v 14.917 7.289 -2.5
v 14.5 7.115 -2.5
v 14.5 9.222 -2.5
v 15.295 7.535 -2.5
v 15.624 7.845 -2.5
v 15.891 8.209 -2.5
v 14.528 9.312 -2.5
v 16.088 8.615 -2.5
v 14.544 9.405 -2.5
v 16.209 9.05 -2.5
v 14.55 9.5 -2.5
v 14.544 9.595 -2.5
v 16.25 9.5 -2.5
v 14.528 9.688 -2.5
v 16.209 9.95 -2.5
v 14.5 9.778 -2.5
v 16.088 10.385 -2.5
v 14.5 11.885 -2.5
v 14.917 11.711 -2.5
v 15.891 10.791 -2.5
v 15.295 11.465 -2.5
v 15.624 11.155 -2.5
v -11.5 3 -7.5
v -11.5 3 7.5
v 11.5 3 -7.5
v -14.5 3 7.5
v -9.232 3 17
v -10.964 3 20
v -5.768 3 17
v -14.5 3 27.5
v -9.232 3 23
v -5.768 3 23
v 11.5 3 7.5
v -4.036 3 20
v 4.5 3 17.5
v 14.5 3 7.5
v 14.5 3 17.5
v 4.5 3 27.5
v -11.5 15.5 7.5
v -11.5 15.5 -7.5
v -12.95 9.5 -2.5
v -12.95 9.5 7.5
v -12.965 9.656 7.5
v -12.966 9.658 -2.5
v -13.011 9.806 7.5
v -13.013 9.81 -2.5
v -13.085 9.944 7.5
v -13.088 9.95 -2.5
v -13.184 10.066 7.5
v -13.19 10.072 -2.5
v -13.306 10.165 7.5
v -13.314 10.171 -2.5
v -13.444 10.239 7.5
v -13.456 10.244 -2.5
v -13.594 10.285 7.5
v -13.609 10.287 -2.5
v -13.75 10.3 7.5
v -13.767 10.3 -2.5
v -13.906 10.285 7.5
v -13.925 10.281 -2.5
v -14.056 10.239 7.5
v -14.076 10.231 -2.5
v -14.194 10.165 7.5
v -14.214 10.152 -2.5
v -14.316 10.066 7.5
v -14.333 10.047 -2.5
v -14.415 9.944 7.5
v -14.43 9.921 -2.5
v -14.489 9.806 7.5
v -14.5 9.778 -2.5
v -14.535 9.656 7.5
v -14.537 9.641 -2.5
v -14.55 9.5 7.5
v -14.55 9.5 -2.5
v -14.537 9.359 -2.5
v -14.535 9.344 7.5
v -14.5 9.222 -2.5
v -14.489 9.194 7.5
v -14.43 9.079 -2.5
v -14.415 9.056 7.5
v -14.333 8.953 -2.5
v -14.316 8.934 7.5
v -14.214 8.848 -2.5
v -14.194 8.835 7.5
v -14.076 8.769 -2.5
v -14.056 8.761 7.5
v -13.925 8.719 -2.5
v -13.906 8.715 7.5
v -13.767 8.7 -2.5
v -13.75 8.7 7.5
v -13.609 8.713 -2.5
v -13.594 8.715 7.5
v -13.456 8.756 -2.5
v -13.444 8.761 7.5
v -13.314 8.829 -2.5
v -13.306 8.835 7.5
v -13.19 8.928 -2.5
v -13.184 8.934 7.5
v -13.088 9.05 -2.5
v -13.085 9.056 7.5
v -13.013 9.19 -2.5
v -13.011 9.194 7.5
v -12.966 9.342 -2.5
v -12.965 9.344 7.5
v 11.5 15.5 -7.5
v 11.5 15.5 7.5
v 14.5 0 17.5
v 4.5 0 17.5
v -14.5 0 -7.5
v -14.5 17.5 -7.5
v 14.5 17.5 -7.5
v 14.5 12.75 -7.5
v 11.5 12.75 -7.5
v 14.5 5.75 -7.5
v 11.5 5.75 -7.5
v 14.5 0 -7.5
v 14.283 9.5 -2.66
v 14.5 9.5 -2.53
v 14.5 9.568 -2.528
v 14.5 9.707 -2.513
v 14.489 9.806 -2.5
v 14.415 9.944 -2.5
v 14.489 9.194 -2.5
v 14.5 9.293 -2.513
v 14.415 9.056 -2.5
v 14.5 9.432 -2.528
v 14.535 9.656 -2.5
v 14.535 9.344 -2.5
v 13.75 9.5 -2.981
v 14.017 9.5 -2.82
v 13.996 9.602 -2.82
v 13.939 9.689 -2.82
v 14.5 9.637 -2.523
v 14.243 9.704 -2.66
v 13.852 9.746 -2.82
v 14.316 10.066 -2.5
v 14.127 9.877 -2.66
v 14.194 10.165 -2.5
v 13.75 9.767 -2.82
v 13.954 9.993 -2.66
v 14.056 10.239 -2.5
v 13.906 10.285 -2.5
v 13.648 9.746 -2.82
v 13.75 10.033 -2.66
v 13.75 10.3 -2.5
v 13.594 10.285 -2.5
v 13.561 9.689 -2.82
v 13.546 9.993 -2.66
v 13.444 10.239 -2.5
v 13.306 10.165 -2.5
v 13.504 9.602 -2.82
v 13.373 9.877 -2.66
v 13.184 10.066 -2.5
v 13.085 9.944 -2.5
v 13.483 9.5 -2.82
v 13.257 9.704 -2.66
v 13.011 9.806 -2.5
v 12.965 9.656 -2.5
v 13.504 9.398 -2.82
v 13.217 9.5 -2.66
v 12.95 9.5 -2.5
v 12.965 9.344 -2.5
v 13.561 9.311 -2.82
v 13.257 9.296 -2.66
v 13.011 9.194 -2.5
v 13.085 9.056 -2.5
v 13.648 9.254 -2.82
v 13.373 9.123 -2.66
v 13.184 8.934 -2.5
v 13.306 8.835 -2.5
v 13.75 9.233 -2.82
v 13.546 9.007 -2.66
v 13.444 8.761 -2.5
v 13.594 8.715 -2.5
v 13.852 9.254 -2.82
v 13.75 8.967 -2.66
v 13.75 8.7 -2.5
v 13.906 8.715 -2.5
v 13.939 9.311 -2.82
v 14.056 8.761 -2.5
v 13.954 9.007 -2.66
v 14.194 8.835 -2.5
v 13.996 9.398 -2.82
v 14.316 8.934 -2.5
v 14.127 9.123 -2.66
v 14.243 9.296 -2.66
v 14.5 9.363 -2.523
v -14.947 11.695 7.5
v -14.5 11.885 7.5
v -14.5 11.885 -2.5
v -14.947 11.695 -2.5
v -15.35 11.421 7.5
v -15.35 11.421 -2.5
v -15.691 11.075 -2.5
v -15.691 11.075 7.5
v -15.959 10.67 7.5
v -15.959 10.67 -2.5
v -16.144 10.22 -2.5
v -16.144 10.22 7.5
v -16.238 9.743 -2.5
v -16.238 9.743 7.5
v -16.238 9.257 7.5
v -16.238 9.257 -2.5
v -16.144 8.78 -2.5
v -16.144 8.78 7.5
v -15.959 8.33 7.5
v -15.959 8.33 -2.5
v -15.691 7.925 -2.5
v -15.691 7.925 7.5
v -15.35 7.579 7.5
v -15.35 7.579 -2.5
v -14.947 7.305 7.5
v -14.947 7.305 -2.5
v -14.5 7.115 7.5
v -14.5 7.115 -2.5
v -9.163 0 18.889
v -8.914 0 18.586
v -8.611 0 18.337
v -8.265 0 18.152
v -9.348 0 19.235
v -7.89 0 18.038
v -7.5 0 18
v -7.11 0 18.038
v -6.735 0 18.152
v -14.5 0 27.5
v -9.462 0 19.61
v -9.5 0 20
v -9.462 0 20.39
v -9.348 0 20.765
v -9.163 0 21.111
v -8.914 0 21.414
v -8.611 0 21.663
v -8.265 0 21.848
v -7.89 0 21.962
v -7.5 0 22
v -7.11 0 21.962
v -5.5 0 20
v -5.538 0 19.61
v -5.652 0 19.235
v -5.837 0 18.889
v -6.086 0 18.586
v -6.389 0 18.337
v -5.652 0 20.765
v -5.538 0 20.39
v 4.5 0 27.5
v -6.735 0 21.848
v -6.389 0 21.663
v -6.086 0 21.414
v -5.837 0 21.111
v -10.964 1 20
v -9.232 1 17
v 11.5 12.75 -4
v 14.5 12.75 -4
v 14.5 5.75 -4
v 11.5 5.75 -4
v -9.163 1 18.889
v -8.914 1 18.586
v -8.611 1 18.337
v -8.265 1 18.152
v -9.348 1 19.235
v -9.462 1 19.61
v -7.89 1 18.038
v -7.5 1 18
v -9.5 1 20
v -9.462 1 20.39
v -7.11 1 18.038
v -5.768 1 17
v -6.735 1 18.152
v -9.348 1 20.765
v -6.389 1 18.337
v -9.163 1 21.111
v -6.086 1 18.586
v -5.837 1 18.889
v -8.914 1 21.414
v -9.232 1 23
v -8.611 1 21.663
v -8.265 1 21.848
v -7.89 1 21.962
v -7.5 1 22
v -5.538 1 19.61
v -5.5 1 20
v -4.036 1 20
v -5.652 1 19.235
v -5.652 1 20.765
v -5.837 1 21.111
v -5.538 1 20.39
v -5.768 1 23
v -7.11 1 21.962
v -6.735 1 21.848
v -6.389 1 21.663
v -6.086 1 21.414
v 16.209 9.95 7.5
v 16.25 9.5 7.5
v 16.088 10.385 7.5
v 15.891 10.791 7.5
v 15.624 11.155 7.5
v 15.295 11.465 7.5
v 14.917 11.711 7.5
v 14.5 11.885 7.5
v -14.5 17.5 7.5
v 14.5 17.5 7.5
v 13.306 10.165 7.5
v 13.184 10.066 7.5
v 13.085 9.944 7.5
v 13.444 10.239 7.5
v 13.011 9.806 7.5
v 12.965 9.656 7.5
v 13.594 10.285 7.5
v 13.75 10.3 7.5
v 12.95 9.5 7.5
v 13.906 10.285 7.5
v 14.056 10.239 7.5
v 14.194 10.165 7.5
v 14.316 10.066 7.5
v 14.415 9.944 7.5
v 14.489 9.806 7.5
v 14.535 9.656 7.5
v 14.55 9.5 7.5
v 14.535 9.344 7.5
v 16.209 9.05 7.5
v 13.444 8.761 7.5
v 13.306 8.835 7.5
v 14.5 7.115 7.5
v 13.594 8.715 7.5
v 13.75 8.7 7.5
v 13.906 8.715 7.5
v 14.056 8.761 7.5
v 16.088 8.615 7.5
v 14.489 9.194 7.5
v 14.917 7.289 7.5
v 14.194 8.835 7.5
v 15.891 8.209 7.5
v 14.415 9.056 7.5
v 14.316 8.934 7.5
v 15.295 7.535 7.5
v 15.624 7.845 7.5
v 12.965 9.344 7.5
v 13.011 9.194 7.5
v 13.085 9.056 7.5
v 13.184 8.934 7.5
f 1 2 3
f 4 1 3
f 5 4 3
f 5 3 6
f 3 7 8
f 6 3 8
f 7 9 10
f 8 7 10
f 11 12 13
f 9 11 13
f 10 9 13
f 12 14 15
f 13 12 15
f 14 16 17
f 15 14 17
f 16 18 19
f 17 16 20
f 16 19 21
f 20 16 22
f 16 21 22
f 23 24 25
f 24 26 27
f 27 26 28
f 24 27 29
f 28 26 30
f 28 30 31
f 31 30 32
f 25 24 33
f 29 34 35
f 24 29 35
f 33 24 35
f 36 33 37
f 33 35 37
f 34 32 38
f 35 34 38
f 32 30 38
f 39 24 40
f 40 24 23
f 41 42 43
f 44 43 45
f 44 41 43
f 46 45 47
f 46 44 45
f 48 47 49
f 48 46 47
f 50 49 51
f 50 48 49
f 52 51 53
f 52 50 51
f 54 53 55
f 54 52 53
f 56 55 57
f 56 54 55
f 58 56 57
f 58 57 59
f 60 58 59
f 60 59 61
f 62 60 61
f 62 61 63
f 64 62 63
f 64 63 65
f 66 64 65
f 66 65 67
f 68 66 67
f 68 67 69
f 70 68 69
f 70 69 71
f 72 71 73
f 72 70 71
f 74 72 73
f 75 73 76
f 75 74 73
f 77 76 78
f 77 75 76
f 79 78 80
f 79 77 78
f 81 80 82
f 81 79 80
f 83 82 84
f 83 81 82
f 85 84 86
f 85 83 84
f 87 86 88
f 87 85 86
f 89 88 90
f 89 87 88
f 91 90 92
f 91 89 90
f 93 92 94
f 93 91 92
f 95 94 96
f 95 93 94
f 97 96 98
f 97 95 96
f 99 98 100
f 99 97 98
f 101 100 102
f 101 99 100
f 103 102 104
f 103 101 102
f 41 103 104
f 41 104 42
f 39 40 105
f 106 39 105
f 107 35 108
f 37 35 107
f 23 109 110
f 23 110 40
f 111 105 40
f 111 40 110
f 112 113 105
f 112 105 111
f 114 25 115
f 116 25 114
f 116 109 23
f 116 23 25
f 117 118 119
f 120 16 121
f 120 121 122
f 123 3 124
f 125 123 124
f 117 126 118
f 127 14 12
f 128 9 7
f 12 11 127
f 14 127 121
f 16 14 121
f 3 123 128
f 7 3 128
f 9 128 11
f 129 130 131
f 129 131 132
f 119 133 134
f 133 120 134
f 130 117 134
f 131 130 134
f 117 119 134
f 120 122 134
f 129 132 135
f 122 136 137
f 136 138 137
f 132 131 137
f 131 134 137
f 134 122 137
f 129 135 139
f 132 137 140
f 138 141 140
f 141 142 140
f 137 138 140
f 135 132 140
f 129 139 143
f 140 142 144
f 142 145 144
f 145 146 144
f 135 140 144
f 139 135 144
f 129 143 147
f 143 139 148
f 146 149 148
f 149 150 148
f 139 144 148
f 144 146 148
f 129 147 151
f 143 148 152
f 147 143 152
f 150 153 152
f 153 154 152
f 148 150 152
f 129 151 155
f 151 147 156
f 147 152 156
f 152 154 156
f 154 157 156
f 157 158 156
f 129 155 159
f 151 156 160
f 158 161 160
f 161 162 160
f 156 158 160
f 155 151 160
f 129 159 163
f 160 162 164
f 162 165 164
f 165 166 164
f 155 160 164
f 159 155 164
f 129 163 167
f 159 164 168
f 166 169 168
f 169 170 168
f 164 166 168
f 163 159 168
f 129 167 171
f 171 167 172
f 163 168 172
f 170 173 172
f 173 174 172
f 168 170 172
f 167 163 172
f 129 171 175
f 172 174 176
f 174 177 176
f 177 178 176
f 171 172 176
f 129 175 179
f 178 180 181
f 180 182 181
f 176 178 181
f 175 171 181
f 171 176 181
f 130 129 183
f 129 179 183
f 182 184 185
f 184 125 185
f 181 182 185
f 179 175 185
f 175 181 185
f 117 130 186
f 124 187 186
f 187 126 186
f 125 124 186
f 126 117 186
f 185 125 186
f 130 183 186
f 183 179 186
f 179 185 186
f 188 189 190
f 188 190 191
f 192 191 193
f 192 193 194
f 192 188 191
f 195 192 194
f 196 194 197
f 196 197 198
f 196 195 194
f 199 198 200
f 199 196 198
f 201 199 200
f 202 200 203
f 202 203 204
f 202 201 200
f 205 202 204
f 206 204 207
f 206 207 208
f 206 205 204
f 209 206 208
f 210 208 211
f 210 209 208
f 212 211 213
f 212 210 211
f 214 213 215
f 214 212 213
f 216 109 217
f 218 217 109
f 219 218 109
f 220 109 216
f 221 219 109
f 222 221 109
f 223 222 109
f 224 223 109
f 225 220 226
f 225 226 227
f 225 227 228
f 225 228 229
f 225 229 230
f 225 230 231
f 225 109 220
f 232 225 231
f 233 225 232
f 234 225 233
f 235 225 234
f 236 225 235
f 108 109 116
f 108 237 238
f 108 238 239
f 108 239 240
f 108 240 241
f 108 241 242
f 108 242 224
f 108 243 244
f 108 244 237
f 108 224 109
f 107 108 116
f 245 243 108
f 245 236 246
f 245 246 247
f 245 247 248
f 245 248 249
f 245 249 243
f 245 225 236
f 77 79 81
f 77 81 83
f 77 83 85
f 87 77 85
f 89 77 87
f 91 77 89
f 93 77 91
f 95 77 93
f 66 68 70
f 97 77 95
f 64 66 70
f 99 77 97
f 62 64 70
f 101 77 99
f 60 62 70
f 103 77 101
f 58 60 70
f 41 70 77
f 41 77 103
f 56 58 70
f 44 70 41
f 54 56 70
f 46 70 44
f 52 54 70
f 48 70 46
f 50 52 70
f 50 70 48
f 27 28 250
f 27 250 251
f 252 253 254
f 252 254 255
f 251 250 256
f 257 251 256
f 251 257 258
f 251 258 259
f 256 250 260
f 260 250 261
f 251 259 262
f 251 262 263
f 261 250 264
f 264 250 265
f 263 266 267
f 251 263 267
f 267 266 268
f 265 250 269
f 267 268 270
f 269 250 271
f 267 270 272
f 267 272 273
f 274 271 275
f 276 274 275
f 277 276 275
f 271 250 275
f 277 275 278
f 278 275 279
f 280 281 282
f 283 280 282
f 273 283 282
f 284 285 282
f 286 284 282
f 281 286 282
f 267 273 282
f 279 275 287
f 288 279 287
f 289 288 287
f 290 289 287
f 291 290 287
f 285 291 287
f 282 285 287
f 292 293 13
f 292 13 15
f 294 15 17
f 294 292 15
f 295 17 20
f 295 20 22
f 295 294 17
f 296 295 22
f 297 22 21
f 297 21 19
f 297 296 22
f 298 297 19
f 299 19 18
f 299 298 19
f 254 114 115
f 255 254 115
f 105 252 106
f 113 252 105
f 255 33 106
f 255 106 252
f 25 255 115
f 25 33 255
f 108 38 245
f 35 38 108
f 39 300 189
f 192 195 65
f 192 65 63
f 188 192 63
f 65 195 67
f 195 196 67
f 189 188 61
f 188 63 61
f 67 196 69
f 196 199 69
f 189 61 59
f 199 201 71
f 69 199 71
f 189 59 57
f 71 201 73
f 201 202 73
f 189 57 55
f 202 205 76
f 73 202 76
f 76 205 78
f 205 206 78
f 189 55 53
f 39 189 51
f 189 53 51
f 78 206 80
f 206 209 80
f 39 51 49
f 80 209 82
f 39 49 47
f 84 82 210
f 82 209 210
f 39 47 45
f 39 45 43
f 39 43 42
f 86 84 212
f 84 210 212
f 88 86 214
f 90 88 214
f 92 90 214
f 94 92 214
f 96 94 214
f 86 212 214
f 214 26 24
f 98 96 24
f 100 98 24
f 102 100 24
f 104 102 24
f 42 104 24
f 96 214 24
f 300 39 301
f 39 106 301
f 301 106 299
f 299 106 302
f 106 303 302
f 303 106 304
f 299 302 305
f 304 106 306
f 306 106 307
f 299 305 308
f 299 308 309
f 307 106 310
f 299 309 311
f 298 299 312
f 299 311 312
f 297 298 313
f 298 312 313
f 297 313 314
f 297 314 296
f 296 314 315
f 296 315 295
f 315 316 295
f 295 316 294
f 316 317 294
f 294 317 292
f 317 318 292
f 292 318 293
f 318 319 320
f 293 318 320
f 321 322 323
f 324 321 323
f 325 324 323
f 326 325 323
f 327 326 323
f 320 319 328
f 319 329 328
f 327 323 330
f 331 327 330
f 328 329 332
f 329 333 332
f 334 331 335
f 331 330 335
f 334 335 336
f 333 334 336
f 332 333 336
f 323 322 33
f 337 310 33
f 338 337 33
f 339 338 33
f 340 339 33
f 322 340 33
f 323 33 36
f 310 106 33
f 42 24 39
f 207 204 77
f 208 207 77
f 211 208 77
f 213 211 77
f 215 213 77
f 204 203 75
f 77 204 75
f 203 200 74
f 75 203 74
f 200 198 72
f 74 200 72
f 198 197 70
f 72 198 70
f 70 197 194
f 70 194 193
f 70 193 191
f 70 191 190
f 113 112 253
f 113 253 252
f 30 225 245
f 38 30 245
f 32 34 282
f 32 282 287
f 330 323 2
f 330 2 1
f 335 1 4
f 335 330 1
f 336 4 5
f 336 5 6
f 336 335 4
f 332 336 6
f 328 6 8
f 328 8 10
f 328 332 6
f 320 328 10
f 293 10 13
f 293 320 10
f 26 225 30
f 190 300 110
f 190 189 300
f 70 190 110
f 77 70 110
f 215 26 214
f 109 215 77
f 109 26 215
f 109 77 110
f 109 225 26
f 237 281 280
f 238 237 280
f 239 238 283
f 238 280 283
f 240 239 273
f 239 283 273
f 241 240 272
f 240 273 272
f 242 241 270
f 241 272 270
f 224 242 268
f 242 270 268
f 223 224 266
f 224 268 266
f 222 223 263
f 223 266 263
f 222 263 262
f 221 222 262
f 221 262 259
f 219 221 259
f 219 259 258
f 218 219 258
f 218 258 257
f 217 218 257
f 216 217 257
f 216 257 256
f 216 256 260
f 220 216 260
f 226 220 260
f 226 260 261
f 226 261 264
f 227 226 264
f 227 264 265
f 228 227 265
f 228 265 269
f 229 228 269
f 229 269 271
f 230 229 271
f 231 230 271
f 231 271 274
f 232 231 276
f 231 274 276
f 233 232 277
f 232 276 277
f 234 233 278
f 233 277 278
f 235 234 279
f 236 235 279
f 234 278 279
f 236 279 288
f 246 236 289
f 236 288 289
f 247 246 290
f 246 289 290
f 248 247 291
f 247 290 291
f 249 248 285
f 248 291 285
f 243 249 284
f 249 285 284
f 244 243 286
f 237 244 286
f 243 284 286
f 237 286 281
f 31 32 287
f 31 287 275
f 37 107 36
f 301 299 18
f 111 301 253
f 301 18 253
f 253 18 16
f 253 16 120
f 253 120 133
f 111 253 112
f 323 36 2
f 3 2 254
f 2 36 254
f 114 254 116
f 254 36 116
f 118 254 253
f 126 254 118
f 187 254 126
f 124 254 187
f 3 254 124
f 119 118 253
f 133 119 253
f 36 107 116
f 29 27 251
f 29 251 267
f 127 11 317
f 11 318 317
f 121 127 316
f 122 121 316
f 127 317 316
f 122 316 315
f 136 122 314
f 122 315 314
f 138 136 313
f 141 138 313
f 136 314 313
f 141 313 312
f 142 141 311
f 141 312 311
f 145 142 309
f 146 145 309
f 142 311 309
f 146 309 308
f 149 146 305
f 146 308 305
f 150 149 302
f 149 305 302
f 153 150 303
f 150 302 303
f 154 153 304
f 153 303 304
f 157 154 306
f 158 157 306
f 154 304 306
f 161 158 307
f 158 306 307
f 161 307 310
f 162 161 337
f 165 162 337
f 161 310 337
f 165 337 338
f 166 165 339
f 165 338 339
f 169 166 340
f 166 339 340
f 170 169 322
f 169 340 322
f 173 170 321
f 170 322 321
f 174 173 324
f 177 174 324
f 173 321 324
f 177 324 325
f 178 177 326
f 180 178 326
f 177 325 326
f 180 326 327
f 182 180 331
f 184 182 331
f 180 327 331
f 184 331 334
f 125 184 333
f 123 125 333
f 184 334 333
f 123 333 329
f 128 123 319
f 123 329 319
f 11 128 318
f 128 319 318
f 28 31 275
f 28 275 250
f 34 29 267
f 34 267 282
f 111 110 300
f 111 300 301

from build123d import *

# Parameters (mm, degrees)
SKETCH1_W                           = 23
SKETCH1_H                           = 15
BOSS_EXTRUDE1_DEPTH                 = 3
BOSS_EXTRUDE2_DEPTH                 = 12.5
BOSS_EXTRUDE2_DEPTH_BACK            = 3
SKETCH2_W                           = 3
SKETCH2_H                           = 15
BOSS_EXTRUDE3_DEPTH                 = 10
TAP_START                           = -2.5
TAP_DRILL_FOR_M2X0_4_TAP1_OUTLINE_R = 0.8
TAP_DRILL_FOR_M2X0_4_TAP1_DEPTH     = 10
SKETCH6_W                           = 29
SKETCH6_H                           = 20
BOSS_EXTRUDE4_DEPTH                 = 3
SKETCH7_W                           = 10
SKETCH7_H                           = 10
CUT_EXTRUDE1_DEPTH                  = 35.301056835
CUT_EXTRUDE2_DEPTH                  = 2
F_4_0_4_DIAMETER_HOLE1_D            = 4
F_4_0_4_DIAMETER_HOLE1_DEPTH        = 10
F_4_0_4_DIAMETER_HOLE1_TIP          = 1.201721238
SKETCH12_W                          = 29
SKETCH12_H                          = 15
BOSS_EXTRUDE5_DEPTH                 = 2
SKETCH13_W                          = 3
SKETCH13_H                          = 7
CUT_EXTRUDE4_DEPTH                  = 3.5


# Read off the part's stored shape, not the designer's step: Tap Drill for M2x0.4 Tap1
with BuildPart() as part:
    # Sketch1 → Boss-Extrude1 (new body)
    with BuildSketch(Plane(origin=(0, 0, 0), x_dir=(1, 0, 0), z_dir=(0, 1, 0))):
        Rectangle(SKETCH1_W, SKETCH1_H)
    extrude(amount=BOSS_EXTRUDE1_DEPTH)

    # Sketch2 → Boss-Extrude2 (add, two sides: drawn at the far end of the back side and taken through both)
    with BuildSketch(Plane(origin=(0, 3, 0), x_dir=(1, 0, 0), z_dir=(0, 1, 0)).offset(-BOSS_EXTRUDE2_DEPTH_BACK)):
        with Locations((13, 0)):
            Rectangle(SKETCH2_W, SKETCH2_H)
        with Locations((-13, 0)):
            Rectangle(SKETCH2_W, SKETCH2_H)
    extrude(amount=BOSS_EXTRUDE2_DEPTH + BOSS_EXTRUDE2_DEPTH_BACK)

    # Sketch3 → Boss-Extrude3 (add)
    with BuildSketch(Plane.XY.offset(7.5)):
        with BuildLine():
            ThreePointArc((16.25, 9.5), (15.765564437, 10.979019946), (14.5, 11.884848004))
            Line((14.5, 11.884848004), (14.5, 7.115151996))
            ThreePointArc((14.5, 7.115151996), (15.765564437, 8.020980054), (16.25, 9.5))
        make_face()
        with BuildLine():
            Line((-14.5, 7.115151996), (-14.5, 11.884848004))
            ThreePointArc((-14.5, 11.884848004), (-16.25, 9.5), (-14.5, 7.115151996))
        make_face()
    extrude(amount=-BOSS_EXTRUDE3_DEPTH)

    # Tap Drill for M2x0.4 Tap1 outline → Tap Drill for M2x0.4 Tap1 (cut)
    with BuildSketch(Plane.XY.offset(TAP_START)):
        with Locations((-13.75, 9.5)):
            Circle(TAP_DRILL_FOR_M2X0_4_TAP1_OUTLINE_R)
    extrude(amount=TAP_DRILL_FOR_M2X0_4_TAP1_DEPTH, mode=Mode.SUBTRACT)

    # Tap Drill for M2x0.4 Tap1 2 outline → Tap Drill for M2x0.4 Tap1 2 (revolve, cut)
    with BuildSketch(Plane(origin=(13.75, 9.5, 0), x_dir=(1, 0, 0), z_dir=(0, -1, 0))):
        Polygon((0, 7.5), (0, -2.980688495), (0.800001695, -2.499998981), (0.8, 7.5), align=None)
    revolve(axis=Axis((13.75, 9.5, 0), (0, 0, 1)), mode=Mode.SUBTRACT)

    # Sketch6 → Boss-Extrude4 (add)
    with BuildSketch(Plane.XZ):
        with Locations((0, 17.5)):
            Rectangle(SKETCH6_W, SKETCH6_H)
    extrude(amount=-BOSS_EXTRUDE4_DEPTH)

    # Sketch7 → Cut-Extrude1 (cut, through all)
    with BuildSketch(Plane(origin=(0, 3, 0), x_dir=(1, 0, 0), z_dir=(0, 1, 0))):
        with Locations((9.5, -22.5)):
            Rectangle(SKETCH7_W, SKETCH7_H)
    extrude(amount=-CUT_EXTRUDE1_DEPTH, mode=Mode.SUBTRACT)

    # Sketch8 → Cut-Extrude2 (cut)
    with BuildSketch(Plane.XZ.offset(-3)):
        Polygon((-5.767949192, 17), (-4.035898385, 20), (-5.767949192, 23), (-9.232050808, 23), (-10.964101615, 20), (-9.232050808, 17), align=None)
    extrude(amount=CUT_EXTRUDE2_DEPTH, mode=Mode.SUBTRACT)

    # Ø4.0 (4) Diameter Hole1
    with Locations(Plane(origin=(0, 0, 0), x_dir=(-1, 0, 0), z_dir=(0, -1, 0))):
        with Locations((7.5, -20)):
            Hole(F_4_0_4_DIAMETER_HOLE1_D / 2, depth=F_4_0_4_DIAMETER_HOLE1_DEPTH)
            with Locations((0, 0, -(F_4_0_4_DIAMETER_HOLE1_DEPTH + F_4_0_4_DIAMETER_HOLE1_TIP / 2))):  # 118° drill point
                Cone(0, F_4_0_4_DIAMETER_HOLE1_D / 2, F_4_0_4_DIAMETER_HOLE1_TIP, mode=Mode.SUBTRACT)

    # Sketch12 → Boss-Extrude5 (add)
    with BuildSketch(Plane(origin=(0, 15.5, 0), x_dir=(1, 0, 0), z_dir=(0, 1, 0))):
        Rectangle(SKETCH12_W, SKETCH12_H)
    extrude(amount=BOSS_EXTRUDE5_DEPTH)

    # Sketch13 → Cut-Extrude4 (cut)
    with BuildSketch(Plane(origin=(0, 0, -7.5), x_dir=(-1, 0, 0), z_dir=(0, 0, -1))):
        with Locations((-13, 9.25)):
            Rectangle(SKETCH13_W, SKETCH13_H)
    extrude(amount=-CUT_EXTRUDE4_DEPTH, mode=Mode.SUBTRACT)


solid = part.part
